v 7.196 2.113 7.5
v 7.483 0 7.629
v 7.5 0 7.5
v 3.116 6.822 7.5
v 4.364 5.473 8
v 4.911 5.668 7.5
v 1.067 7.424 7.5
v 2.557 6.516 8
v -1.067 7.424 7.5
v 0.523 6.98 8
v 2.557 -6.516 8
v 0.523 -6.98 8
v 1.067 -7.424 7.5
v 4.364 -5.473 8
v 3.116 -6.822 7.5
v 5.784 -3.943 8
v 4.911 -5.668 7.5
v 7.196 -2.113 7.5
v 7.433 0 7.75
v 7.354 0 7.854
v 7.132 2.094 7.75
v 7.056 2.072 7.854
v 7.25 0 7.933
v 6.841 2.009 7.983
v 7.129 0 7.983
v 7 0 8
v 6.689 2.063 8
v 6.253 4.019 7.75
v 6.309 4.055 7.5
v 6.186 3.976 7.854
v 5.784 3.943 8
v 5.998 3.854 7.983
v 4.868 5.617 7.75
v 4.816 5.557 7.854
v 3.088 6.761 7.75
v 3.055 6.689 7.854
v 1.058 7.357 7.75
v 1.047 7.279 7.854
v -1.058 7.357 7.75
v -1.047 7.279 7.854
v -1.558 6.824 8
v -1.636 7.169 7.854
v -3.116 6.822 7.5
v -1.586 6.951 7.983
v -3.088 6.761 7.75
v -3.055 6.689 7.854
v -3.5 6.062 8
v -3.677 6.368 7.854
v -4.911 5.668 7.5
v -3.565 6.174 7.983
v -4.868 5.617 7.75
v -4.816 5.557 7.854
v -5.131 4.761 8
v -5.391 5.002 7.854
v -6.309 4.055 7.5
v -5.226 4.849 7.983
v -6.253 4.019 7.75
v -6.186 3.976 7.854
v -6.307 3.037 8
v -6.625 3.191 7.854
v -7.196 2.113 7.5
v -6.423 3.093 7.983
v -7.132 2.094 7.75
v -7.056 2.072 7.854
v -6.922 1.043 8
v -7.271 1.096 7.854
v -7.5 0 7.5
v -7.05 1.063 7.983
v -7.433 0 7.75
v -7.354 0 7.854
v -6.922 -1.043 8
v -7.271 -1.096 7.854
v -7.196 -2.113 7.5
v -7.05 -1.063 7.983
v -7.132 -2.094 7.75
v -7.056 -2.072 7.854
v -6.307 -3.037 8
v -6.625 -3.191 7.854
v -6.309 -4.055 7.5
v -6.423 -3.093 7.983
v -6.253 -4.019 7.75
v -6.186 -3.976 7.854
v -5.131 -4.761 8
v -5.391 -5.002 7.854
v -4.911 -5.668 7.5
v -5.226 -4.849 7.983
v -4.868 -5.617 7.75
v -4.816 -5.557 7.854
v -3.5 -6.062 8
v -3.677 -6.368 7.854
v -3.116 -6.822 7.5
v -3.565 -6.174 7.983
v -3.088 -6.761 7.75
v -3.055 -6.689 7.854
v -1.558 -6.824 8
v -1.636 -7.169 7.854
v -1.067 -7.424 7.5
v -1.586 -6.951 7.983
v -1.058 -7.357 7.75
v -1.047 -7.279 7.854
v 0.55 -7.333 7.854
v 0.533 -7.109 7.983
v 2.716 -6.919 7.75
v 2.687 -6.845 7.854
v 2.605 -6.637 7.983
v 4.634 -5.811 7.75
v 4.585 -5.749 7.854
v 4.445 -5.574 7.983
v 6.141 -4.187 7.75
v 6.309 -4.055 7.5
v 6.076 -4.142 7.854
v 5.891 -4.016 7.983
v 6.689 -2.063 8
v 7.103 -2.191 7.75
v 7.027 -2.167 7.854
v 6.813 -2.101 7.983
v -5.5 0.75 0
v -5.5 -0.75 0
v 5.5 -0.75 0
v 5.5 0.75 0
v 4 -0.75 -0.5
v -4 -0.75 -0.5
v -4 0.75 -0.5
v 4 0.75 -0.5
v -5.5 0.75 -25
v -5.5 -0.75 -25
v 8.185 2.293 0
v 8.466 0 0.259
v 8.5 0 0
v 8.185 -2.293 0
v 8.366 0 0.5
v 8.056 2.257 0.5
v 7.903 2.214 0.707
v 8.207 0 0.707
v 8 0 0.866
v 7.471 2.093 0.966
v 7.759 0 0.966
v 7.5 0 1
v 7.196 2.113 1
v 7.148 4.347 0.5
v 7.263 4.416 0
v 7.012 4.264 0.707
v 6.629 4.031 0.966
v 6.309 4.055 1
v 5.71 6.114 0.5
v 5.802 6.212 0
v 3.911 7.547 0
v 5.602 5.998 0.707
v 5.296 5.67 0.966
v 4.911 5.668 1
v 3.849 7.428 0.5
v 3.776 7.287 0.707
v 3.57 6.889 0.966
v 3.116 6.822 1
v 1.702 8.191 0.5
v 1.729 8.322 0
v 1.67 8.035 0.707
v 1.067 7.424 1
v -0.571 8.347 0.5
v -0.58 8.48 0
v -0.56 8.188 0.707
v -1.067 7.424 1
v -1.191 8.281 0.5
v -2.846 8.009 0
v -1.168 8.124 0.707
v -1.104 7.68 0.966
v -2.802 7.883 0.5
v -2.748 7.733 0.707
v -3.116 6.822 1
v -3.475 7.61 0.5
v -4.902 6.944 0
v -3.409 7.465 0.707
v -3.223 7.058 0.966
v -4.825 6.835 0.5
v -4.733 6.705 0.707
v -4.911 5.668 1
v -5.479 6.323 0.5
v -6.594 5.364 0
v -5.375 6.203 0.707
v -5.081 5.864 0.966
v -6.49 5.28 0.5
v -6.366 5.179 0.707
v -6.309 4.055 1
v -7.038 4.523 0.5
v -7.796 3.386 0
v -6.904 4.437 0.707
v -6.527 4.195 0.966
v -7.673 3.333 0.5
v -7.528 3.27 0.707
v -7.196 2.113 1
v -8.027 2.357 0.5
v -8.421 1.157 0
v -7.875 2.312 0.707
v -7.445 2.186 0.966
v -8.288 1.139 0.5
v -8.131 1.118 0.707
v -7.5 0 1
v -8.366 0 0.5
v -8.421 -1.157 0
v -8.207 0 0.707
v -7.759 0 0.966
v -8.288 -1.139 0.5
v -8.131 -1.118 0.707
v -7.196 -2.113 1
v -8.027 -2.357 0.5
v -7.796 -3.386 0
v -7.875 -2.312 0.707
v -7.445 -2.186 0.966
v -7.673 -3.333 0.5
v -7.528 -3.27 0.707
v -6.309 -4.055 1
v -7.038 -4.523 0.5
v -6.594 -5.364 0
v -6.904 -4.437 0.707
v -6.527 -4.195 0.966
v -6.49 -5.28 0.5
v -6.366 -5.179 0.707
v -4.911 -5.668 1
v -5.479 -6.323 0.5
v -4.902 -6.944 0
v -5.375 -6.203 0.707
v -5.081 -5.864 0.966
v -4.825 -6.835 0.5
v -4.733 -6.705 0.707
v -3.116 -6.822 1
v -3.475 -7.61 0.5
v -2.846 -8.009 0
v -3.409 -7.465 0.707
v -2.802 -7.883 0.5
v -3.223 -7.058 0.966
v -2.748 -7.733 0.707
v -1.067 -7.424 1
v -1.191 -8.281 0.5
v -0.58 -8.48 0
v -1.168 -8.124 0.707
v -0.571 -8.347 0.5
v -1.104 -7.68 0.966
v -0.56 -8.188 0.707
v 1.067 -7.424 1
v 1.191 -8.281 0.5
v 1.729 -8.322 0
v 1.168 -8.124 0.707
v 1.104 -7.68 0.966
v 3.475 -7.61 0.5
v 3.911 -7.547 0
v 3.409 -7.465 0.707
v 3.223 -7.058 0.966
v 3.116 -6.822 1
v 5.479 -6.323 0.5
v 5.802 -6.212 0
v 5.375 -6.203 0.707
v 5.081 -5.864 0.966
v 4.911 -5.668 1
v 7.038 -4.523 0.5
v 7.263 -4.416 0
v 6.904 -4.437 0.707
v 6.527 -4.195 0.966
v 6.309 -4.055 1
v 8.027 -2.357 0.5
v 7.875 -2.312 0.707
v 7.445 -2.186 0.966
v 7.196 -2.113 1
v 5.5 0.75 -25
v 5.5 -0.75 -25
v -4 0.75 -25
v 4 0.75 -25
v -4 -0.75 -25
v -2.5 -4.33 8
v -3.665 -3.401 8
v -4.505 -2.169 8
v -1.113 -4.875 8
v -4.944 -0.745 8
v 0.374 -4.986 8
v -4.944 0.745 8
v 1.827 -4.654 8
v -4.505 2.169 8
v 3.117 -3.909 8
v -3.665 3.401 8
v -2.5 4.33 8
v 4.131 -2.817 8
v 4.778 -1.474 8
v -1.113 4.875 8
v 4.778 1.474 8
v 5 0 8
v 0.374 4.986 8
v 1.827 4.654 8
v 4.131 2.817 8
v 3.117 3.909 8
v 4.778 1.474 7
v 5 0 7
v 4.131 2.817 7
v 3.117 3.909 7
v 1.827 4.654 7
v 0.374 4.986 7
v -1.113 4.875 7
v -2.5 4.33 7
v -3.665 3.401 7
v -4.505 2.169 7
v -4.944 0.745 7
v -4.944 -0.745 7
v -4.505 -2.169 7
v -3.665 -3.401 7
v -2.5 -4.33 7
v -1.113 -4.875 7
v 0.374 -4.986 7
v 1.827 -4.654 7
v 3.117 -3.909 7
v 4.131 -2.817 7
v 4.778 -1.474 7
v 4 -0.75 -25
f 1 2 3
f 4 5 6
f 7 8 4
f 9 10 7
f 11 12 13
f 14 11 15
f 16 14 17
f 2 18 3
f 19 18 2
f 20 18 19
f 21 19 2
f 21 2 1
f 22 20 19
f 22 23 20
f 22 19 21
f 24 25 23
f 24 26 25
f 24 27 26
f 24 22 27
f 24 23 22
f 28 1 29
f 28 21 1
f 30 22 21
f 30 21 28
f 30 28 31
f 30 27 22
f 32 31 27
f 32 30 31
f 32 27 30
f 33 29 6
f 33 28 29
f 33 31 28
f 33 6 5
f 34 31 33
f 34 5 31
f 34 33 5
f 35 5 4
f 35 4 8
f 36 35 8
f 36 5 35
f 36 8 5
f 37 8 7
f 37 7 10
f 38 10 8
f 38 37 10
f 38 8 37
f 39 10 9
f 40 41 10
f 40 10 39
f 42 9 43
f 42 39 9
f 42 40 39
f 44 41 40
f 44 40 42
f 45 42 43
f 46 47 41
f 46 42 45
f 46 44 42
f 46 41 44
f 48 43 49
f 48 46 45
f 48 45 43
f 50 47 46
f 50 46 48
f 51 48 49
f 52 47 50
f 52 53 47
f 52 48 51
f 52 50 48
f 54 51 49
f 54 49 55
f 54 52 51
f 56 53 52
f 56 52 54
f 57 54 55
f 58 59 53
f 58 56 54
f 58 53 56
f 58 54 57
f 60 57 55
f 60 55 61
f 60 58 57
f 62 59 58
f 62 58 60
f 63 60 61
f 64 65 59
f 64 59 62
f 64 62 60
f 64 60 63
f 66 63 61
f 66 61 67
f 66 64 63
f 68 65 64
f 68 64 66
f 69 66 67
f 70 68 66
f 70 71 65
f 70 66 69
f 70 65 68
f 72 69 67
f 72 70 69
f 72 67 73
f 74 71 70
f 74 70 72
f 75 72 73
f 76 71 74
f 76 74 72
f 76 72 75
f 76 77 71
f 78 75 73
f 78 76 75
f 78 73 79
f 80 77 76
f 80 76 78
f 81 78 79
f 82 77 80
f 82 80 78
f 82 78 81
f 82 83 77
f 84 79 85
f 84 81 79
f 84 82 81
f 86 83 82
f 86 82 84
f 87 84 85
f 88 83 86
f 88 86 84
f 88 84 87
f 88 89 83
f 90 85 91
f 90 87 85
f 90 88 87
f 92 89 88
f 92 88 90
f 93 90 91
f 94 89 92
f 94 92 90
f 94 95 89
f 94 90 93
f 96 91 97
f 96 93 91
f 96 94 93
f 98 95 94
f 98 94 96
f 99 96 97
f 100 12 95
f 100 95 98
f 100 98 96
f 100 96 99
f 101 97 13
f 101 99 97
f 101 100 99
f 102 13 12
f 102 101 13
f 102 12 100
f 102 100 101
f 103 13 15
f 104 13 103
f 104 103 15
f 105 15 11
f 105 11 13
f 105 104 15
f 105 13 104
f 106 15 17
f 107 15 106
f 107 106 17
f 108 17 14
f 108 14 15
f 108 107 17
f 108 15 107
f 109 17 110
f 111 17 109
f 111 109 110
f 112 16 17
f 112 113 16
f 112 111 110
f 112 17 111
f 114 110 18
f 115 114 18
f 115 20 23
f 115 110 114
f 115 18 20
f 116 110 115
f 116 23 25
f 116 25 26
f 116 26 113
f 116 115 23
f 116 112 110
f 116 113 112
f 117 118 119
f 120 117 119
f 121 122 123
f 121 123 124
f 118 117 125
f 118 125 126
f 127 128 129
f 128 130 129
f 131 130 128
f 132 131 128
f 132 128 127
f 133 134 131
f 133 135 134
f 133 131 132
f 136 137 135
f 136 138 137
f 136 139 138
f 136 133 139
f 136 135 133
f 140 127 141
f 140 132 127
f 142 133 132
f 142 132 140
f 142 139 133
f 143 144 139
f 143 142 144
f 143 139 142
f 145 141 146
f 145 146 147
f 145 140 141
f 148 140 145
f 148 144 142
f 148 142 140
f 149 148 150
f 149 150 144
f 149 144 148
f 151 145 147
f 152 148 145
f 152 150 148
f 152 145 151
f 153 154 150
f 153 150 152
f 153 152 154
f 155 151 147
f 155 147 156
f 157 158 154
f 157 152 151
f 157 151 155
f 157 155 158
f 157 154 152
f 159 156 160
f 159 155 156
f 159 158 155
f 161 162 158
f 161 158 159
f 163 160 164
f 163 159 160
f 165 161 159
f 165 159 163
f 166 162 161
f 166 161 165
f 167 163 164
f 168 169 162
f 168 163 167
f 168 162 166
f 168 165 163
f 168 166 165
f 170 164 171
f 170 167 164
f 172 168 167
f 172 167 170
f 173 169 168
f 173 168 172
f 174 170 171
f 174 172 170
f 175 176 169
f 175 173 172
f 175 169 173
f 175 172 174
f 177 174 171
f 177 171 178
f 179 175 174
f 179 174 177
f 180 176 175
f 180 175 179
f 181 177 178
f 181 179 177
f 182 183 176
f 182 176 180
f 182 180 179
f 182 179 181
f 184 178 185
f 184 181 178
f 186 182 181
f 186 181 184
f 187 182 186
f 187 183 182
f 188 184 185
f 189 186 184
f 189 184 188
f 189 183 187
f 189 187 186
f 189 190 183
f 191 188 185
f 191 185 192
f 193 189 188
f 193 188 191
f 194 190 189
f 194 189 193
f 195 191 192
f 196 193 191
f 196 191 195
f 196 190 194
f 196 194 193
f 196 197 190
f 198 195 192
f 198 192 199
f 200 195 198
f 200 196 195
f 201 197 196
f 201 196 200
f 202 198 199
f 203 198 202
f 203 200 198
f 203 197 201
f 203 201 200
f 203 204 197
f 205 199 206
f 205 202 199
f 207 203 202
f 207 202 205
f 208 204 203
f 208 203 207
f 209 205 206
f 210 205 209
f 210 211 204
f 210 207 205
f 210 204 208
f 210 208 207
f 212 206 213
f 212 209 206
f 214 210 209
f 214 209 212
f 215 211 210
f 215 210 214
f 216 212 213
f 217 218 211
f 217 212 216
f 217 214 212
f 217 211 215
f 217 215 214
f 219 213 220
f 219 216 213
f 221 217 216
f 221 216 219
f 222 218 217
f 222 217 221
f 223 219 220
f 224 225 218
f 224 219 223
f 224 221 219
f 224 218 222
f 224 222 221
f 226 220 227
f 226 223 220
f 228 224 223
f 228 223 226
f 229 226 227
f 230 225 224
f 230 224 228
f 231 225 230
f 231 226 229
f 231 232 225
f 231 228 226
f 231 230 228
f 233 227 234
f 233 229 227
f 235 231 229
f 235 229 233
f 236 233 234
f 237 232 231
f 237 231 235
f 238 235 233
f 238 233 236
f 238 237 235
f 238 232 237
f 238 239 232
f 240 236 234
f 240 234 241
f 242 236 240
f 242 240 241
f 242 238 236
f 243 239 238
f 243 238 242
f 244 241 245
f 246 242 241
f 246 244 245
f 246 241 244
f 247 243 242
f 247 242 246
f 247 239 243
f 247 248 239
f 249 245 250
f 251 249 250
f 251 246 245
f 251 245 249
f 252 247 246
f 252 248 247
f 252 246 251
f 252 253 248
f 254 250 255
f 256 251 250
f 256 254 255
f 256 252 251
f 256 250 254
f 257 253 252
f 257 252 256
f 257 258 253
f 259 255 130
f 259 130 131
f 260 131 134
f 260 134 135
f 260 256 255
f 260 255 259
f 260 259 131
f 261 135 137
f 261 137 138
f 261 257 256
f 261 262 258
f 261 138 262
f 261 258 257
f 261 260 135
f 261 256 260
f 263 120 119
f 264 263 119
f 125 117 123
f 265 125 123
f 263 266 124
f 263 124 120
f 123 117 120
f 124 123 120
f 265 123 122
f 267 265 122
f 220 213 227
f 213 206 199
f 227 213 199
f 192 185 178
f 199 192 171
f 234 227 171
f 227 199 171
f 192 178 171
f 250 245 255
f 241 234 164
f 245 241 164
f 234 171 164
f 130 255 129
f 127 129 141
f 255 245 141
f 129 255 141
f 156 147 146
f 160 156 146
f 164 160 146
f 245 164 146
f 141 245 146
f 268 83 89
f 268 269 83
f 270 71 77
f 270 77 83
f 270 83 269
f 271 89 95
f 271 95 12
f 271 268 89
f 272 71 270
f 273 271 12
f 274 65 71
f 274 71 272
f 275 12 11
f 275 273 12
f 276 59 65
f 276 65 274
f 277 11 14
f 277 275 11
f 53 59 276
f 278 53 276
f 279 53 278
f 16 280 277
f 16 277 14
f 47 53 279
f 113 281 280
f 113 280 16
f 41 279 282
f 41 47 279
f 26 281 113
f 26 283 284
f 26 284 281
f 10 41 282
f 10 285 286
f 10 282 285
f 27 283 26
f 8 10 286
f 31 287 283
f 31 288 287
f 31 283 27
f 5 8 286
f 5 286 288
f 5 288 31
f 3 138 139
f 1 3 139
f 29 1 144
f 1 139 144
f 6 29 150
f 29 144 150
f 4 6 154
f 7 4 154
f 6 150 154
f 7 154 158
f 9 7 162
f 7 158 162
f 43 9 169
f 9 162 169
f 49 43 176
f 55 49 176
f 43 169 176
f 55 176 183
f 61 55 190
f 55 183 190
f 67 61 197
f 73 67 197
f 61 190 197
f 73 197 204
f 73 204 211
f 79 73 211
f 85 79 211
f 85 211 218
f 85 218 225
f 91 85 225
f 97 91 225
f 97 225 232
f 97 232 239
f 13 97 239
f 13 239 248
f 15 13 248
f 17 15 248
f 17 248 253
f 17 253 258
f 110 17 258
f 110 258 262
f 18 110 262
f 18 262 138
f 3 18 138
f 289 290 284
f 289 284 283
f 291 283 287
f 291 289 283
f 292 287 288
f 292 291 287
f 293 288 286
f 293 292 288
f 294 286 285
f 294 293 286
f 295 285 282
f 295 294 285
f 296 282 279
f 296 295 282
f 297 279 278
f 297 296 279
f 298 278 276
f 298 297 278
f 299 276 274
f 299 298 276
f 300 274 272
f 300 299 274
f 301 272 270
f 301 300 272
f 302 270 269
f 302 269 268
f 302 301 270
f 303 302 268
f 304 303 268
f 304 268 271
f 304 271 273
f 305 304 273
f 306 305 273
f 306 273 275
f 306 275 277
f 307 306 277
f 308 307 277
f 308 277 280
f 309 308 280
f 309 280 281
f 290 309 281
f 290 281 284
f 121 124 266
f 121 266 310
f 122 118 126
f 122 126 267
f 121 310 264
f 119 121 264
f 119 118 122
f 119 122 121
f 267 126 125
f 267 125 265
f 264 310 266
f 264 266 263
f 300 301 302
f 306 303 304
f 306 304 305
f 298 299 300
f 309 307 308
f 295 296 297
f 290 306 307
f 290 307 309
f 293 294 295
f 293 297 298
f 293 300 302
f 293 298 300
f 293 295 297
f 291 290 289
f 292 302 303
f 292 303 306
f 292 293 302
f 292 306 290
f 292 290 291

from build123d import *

# Parameters (mm, degrees)
F0_R     = 5
F1_DEPTH = 7
F0_R_2   = 7.5
F2_DEPTH = 8
F0_R_3   = 8.5
F3_DEPTH = 1
F4_R     = 0.99999
F5_R     = 0.5
F6_W     = 1.5
F6_H     = 1.5
F7_DEPTH = 25
F6_W_2   = 8
F9_DEPTH = 0.5


# Not quite as in the source:
# - a fillet or chamfer is up to 0.001 mm smaller than in the source, because OpenCascade refuses the exact size


with BuildPart() as f1:
    # F0 (on Top) → F1 (new body)
    with BuildSketch(Plane.XY):
        Circle(F0_R)
    extrude(amount=F1_DEPTH)

    # F0 (on Top) → F2 (join)
    with BuildSketch(Plane.XY):
        Circle(F0_R_2)
        Circle(F0_R, mode=Mode.SUBTRACT)
    extrude(amount=F2_DEPTH)

    # F0 (on Top) → F3 (join)
    with BuildSketch(Plane.XY):
        Circle(F0_R_3)
        Circle(F0_R_2, mode=Mode.SUBTRACT)
    extrude(amount=F3_DEPTH)

    # F4 (radius 1 in the source; OpenCascade refuses exactly that, so slightly less here)
    f4_edges = [f1.edges().sort_by_distance(p)[0] for p in [
        (-8.5, 0, 1),
    ]]
    fillet(f4_edges, radius=F4_R)

    # F5
    f5_edges = [f1.edges().sort_by_distance(p)[0] for p in [
        (-7.5, 0, 8),
    ]]
    fillet(f5_edges, radius=F5_R)


with BuildPart() as f7:
    # F6 (on face) → F7 (new body)
    with BuildSketch(Plane(origin=(0, 0, 0), x_dir=(1, 0, 0), z_dir=(0, 0, -1))):
        with Locations((-4.75, 0)):
            Rectangle(F6_W, F6_H)
    extrude(amount=F7_DEPTH)



with BuildPart() as f7b:
    # F6 (on face) → F7, piece 2 (new body)
    with BuildSketch(Plane(origin=(0, 0, 0), x_dir=(1, 0, 0), z_dir=(0, 0, -1))):
        with Locations((4.75, 0)):
            Rectangle(F6_W, F6_H)
    extrude(amount=F7_DEPTH)


with BuildPart() as f7_1:
    add(f7.part)

    add(f7b.part)  # F9 merges F7b
    # F6 (on face) → F9 (join)
    with BuildSketch(Plane(origin=(0, 0, 0), x_dir=(1, 0, 0), z_dir=(0, 0, -1))):
        Rectangle(F6_W_2, F6_H)
    extrude(amount=F9_DEPTH)


solid = Compound([f1.part, f7_1.part])
